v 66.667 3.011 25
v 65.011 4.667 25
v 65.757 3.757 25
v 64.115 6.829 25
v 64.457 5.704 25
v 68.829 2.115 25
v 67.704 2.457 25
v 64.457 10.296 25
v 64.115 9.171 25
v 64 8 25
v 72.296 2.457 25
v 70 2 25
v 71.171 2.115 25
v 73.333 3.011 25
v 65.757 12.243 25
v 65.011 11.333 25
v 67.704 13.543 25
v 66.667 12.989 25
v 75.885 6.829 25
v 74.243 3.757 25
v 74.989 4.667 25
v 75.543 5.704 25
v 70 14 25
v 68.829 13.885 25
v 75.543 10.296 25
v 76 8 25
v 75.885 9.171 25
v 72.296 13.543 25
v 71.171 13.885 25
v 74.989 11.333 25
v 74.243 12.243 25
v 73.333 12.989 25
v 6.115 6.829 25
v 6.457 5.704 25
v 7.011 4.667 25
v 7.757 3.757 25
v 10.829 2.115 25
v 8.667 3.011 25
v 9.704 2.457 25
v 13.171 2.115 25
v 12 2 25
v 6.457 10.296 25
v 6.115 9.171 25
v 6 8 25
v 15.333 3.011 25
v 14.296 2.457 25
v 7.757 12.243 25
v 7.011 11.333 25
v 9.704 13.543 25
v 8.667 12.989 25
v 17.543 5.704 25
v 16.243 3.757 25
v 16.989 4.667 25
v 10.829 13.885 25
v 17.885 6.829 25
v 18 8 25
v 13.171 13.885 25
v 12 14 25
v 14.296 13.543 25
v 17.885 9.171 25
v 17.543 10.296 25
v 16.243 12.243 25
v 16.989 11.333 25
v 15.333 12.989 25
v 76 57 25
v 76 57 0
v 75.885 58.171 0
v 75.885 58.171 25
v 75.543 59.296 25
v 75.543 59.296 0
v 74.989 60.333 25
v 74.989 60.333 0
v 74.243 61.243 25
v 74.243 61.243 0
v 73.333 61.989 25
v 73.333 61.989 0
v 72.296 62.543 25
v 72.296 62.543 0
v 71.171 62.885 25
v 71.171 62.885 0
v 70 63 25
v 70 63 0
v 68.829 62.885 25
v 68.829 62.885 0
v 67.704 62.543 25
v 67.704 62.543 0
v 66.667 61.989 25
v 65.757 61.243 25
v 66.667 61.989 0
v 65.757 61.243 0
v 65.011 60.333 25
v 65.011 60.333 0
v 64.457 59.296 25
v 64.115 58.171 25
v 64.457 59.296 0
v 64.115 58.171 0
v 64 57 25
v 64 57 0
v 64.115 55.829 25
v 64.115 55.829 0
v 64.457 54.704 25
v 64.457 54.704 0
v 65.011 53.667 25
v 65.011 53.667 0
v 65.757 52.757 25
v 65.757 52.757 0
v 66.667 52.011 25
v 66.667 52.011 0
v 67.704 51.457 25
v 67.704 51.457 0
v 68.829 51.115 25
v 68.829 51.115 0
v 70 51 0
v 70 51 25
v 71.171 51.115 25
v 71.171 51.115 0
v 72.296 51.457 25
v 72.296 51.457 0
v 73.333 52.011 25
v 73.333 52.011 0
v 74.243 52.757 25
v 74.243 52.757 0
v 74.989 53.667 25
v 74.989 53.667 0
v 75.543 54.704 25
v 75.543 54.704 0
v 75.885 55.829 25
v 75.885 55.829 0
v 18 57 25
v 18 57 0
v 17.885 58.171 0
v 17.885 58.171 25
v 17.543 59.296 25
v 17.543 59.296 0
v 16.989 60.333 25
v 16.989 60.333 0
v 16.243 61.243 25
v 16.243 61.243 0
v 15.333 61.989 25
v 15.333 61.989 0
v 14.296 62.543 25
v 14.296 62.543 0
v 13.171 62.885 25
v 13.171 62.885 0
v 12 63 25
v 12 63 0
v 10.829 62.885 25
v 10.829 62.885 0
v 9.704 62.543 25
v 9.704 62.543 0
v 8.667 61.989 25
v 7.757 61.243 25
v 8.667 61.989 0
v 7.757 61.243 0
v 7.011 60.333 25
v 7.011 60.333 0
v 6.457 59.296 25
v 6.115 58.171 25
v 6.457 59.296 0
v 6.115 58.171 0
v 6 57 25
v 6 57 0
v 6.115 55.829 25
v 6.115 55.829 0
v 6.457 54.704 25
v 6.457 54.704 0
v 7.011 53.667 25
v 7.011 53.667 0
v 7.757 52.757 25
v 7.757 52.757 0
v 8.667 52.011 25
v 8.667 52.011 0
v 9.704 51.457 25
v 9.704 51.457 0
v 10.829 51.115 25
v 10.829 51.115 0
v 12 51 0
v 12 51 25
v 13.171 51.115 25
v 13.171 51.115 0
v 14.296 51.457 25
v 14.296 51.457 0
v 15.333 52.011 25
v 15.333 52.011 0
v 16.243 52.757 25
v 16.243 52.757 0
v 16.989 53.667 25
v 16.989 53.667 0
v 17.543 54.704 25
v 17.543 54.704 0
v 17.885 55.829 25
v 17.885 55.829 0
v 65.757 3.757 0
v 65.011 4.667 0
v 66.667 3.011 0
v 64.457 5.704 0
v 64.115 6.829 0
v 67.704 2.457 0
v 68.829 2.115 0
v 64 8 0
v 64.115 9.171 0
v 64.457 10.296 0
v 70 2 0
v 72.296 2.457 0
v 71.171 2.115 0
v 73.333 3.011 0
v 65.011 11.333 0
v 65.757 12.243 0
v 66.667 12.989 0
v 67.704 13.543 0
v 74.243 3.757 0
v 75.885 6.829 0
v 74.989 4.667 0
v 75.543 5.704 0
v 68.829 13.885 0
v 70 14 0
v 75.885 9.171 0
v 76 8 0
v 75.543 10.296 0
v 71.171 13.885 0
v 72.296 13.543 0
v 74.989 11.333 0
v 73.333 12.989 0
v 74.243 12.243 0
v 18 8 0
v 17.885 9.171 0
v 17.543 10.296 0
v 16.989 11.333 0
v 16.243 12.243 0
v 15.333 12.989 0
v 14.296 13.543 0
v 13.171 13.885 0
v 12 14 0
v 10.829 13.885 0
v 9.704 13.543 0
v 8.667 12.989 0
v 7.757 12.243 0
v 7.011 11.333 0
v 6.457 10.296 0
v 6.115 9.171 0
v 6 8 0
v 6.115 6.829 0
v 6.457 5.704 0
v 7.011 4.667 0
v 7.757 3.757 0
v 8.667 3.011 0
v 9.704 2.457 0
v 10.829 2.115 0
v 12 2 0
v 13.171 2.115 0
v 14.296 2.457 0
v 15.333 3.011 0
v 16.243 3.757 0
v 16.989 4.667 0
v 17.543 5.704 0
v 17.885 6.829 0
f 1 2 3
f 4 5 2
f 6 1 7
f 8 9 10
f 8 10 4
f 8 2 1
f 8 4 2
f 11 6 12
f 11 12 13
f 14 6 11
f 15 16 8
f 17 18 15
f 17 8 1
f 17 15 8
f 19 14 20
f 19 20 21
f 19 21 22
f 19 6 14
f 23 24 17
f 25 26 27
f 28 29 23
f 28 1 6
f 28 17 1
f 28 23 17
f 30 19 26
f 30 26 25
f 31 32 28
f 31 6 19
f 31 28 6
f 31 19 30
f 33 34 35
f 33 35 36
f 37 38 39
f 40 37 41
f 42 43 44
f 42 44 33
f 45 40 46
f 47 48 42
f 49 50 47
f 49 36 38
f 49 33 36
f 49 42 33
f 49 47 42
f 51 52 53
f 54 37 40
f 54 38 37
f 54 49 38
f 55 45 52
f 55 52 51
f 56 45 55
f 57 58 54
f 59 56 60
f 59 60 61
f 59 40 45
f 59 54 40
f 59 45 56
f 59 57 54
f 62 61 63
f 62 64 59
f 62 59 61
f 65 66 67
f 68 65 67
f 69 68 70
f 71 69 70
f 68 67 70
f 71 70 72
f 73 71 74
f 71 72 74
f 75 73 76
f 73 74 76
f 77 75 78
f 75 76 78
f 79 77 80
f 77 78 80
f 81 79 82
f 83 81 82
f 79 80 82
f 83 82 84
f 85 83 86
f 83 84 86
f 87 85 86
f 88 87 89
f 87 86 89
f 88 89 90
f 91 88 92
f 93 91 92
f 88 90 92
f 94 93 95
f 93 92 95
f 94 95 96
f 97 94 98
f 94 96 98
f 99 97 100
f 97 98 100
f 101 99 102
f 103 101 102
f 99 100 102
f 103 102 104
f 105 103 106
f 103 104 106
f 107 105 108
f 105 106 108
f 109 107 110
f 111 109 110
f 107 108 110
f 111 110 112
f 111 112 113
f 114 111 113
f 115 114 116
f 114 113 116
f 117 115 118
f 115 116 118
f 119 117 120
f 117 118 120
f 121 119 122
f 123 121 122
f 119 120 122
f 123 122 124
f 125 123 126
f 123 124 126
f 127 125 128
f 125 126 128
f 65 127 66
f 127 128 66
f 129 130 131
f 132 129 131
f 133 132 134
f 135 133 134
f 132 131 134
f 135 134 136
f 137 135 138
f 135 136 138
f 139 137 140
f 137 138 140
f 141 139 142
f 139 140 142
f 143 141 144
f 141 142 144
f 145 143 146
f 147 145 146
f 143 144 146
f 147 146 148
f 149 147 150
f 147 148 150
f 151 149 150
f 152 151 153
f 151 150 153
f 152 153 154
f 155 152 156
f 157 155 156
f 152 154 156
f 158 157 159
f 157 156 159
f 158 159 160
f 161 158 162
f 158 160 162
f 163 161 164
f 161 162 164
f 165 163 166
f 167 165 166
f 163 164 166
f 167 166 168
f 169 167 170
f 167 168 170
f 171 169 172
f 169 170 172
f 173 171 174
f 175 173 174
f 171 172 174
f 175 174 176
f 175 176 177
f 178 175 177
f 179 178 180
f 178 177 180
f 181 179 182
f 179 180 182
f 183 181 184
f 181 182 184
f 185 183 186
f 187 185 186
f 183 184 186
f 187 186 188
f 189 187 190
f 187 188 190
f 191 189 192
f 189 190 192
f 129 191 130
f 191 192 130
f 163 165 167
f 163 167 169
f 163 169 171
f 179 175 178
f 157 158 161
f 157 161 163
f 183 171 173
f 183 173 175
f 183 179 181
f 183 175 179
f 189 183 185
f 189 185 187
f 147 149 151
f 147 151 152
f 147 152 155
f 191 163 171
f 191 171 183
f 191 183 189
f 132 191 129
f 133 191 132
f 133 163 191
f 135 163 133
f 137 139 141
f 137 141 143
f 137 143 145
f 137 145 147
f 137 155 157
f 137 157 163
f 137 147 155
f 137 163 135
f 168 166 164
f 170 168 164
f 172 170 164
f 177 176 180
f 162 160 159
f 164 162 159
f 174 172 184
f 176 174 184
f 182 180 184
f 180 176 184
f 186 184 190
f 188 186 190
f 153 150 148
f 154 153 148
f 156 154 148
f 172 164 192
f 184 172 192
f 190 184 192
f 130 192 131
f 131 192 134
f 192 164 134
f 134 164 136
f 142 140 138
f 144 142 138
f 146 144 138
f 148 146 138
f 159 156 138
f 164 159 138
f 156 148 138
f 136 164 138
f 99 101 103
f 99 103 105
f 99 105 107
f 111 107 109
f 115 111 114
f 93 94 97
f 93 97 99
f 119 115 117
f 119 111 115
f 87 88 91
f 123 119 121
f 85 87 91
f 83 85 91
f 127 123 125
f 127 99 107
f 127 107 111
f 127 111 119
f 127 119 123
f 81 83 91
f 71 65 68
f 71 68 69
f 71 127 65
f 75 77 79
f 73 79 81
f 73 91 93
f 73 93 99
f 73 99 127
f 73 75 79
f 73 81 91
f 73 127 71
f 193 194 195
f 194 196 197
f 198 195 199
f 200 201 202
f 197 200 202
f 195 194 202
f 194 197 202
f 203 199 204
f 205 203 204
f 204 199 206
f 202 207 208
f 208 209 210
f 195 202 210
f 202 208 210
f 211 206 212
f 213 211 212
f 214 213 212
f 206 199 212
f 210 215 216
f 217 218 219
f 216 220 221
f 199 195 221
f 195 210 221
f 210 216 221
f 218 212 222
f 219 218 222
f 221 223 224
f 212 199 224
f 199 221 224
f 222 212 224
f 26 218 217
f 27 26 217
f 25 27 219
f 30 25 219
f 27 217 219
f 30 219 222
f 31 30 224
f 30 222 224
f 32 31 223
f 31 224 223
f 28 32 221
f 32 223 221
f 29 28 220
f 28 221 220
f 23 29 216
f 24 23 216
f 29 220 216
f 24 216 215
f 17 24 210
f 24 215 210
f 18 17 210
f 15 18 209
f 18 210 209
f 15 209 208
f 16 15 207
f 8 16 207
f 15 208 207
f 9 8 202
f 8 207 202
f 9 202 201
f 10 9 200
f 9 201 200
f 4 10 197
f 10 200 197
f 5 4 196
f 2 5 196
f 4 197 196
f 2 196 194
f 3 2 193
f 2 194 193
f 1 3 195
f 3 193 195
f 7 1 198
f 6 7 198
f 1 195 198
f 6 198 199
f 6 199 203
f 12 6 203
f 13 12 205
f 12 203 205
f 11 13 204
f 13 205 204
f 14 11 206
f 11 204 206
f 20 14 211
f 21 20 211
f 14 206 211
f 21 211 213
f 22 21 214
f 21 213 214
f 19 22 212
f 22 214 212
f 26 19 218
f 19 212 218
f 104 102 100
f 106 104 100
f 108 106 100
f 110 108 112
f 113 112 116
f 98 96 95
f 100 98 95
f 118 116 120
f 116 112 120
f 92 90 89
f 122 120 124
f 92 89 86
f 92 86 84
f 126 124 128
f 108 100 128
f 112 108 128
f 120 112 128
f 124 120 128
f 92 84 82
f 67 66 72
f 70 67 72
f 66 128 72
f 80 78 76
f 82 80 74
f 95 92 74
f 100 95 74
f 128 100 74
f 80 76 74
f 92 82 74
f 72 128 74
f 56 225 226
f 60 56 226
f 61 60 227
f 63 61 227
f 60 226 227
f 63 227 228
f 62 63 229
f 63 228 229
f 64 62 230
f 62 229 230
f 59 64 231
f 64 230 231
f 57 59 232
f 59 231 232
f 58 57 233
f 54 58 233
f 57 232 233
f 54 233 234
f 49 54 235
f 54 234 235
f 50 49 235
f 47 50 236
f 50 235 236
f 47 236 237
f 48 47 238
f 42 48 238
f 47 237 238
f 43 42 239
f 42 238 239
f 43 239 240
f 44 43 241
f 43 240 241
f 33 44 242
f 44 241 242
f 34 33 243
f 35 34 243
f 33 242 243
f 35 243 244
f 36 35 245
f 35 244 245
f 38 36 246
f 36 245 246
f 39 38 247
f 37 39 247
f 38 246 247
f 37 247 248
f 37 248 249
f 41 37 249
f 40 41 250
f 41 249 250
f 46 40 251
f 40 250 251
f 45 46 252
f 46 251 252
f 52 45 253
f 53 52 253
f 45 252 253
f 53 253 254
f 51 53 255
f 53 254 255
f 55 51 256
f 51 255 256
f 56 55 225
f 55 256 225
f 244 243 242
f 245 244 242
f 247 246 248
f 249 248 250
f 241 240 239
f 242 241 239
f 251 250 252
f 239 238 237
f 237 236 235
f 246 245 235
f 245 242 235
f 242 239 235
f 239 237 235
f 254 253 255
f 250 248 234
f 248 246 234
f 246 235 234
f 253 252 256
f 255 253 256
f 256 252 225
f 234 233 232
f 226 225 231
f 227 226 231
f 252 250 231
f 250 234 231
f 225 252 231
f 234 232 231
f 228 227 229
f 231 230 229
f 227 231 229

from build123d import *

# Parameters (mm, degrees)
CYLINDER018_R     = 6
CYLINDER018_DEPTH = 25
CYLINDER017_R     = 6
CYLINDER017_DEPTH = 25
CYLINDER016_R     = 6
CYLINDER016_DEPTH = 25
CYLINDER019_R     = 6
CYLINDER019_DEPTH = 25


with BuildPart() as cylinder018:
    # Cylinder018 → Cylinder018 (new body)
    with BuildSketch(Plane(origin=(70, 57, 0), x_dir=(1, 0, 0), z_dir=(0, 0, 1))):
        Circle(CYLINDER018_R)
    extrude(amount=CYLINDER018_DEPTH)


with BuildPart() as cylinder017:
    # Cylinder017 → Cylinder017 (new body)
    with BuildSketch(Plane(origin=(12, 8, 0), x_dir=(1, 0, 0), z_dir=(0, 0, 1))):
        Circle(CYLINDER017_R)
    extrude(amount=CYLINDER017_DEPTH)


with BuildPart() as cylinder016:
    # Cylinder016 → Cylinder016 (new body)
    with BuildSketch(Plane(origin=(12, 57, 0), x_dir=(1, 0, 0), z_dir=(0, 0, 1))):
        Circle(CYLINDER016_R)
    extrude(amount=CYLINDER016_DEPTH)


with BuildPart() as distanzhalter001:
    # Cylinder019 → Cylinder019 (new body)
    with BuildSketch(Plane(origin=(70, 8, 0), x_dir=(1, 0, 0), z_dir=(0, 0, 1))):
        Circle(CYLINDER019_R)
    extrude(amount=CYLINDER019_DEPTH)

    # Fusion007: union Cylinder018, Cylinder017, Cylinder016
    add(cylinder018.part)
    add(cylinder017.part)
    add(cylinder016.part)


solid = distanzhalter001.part
